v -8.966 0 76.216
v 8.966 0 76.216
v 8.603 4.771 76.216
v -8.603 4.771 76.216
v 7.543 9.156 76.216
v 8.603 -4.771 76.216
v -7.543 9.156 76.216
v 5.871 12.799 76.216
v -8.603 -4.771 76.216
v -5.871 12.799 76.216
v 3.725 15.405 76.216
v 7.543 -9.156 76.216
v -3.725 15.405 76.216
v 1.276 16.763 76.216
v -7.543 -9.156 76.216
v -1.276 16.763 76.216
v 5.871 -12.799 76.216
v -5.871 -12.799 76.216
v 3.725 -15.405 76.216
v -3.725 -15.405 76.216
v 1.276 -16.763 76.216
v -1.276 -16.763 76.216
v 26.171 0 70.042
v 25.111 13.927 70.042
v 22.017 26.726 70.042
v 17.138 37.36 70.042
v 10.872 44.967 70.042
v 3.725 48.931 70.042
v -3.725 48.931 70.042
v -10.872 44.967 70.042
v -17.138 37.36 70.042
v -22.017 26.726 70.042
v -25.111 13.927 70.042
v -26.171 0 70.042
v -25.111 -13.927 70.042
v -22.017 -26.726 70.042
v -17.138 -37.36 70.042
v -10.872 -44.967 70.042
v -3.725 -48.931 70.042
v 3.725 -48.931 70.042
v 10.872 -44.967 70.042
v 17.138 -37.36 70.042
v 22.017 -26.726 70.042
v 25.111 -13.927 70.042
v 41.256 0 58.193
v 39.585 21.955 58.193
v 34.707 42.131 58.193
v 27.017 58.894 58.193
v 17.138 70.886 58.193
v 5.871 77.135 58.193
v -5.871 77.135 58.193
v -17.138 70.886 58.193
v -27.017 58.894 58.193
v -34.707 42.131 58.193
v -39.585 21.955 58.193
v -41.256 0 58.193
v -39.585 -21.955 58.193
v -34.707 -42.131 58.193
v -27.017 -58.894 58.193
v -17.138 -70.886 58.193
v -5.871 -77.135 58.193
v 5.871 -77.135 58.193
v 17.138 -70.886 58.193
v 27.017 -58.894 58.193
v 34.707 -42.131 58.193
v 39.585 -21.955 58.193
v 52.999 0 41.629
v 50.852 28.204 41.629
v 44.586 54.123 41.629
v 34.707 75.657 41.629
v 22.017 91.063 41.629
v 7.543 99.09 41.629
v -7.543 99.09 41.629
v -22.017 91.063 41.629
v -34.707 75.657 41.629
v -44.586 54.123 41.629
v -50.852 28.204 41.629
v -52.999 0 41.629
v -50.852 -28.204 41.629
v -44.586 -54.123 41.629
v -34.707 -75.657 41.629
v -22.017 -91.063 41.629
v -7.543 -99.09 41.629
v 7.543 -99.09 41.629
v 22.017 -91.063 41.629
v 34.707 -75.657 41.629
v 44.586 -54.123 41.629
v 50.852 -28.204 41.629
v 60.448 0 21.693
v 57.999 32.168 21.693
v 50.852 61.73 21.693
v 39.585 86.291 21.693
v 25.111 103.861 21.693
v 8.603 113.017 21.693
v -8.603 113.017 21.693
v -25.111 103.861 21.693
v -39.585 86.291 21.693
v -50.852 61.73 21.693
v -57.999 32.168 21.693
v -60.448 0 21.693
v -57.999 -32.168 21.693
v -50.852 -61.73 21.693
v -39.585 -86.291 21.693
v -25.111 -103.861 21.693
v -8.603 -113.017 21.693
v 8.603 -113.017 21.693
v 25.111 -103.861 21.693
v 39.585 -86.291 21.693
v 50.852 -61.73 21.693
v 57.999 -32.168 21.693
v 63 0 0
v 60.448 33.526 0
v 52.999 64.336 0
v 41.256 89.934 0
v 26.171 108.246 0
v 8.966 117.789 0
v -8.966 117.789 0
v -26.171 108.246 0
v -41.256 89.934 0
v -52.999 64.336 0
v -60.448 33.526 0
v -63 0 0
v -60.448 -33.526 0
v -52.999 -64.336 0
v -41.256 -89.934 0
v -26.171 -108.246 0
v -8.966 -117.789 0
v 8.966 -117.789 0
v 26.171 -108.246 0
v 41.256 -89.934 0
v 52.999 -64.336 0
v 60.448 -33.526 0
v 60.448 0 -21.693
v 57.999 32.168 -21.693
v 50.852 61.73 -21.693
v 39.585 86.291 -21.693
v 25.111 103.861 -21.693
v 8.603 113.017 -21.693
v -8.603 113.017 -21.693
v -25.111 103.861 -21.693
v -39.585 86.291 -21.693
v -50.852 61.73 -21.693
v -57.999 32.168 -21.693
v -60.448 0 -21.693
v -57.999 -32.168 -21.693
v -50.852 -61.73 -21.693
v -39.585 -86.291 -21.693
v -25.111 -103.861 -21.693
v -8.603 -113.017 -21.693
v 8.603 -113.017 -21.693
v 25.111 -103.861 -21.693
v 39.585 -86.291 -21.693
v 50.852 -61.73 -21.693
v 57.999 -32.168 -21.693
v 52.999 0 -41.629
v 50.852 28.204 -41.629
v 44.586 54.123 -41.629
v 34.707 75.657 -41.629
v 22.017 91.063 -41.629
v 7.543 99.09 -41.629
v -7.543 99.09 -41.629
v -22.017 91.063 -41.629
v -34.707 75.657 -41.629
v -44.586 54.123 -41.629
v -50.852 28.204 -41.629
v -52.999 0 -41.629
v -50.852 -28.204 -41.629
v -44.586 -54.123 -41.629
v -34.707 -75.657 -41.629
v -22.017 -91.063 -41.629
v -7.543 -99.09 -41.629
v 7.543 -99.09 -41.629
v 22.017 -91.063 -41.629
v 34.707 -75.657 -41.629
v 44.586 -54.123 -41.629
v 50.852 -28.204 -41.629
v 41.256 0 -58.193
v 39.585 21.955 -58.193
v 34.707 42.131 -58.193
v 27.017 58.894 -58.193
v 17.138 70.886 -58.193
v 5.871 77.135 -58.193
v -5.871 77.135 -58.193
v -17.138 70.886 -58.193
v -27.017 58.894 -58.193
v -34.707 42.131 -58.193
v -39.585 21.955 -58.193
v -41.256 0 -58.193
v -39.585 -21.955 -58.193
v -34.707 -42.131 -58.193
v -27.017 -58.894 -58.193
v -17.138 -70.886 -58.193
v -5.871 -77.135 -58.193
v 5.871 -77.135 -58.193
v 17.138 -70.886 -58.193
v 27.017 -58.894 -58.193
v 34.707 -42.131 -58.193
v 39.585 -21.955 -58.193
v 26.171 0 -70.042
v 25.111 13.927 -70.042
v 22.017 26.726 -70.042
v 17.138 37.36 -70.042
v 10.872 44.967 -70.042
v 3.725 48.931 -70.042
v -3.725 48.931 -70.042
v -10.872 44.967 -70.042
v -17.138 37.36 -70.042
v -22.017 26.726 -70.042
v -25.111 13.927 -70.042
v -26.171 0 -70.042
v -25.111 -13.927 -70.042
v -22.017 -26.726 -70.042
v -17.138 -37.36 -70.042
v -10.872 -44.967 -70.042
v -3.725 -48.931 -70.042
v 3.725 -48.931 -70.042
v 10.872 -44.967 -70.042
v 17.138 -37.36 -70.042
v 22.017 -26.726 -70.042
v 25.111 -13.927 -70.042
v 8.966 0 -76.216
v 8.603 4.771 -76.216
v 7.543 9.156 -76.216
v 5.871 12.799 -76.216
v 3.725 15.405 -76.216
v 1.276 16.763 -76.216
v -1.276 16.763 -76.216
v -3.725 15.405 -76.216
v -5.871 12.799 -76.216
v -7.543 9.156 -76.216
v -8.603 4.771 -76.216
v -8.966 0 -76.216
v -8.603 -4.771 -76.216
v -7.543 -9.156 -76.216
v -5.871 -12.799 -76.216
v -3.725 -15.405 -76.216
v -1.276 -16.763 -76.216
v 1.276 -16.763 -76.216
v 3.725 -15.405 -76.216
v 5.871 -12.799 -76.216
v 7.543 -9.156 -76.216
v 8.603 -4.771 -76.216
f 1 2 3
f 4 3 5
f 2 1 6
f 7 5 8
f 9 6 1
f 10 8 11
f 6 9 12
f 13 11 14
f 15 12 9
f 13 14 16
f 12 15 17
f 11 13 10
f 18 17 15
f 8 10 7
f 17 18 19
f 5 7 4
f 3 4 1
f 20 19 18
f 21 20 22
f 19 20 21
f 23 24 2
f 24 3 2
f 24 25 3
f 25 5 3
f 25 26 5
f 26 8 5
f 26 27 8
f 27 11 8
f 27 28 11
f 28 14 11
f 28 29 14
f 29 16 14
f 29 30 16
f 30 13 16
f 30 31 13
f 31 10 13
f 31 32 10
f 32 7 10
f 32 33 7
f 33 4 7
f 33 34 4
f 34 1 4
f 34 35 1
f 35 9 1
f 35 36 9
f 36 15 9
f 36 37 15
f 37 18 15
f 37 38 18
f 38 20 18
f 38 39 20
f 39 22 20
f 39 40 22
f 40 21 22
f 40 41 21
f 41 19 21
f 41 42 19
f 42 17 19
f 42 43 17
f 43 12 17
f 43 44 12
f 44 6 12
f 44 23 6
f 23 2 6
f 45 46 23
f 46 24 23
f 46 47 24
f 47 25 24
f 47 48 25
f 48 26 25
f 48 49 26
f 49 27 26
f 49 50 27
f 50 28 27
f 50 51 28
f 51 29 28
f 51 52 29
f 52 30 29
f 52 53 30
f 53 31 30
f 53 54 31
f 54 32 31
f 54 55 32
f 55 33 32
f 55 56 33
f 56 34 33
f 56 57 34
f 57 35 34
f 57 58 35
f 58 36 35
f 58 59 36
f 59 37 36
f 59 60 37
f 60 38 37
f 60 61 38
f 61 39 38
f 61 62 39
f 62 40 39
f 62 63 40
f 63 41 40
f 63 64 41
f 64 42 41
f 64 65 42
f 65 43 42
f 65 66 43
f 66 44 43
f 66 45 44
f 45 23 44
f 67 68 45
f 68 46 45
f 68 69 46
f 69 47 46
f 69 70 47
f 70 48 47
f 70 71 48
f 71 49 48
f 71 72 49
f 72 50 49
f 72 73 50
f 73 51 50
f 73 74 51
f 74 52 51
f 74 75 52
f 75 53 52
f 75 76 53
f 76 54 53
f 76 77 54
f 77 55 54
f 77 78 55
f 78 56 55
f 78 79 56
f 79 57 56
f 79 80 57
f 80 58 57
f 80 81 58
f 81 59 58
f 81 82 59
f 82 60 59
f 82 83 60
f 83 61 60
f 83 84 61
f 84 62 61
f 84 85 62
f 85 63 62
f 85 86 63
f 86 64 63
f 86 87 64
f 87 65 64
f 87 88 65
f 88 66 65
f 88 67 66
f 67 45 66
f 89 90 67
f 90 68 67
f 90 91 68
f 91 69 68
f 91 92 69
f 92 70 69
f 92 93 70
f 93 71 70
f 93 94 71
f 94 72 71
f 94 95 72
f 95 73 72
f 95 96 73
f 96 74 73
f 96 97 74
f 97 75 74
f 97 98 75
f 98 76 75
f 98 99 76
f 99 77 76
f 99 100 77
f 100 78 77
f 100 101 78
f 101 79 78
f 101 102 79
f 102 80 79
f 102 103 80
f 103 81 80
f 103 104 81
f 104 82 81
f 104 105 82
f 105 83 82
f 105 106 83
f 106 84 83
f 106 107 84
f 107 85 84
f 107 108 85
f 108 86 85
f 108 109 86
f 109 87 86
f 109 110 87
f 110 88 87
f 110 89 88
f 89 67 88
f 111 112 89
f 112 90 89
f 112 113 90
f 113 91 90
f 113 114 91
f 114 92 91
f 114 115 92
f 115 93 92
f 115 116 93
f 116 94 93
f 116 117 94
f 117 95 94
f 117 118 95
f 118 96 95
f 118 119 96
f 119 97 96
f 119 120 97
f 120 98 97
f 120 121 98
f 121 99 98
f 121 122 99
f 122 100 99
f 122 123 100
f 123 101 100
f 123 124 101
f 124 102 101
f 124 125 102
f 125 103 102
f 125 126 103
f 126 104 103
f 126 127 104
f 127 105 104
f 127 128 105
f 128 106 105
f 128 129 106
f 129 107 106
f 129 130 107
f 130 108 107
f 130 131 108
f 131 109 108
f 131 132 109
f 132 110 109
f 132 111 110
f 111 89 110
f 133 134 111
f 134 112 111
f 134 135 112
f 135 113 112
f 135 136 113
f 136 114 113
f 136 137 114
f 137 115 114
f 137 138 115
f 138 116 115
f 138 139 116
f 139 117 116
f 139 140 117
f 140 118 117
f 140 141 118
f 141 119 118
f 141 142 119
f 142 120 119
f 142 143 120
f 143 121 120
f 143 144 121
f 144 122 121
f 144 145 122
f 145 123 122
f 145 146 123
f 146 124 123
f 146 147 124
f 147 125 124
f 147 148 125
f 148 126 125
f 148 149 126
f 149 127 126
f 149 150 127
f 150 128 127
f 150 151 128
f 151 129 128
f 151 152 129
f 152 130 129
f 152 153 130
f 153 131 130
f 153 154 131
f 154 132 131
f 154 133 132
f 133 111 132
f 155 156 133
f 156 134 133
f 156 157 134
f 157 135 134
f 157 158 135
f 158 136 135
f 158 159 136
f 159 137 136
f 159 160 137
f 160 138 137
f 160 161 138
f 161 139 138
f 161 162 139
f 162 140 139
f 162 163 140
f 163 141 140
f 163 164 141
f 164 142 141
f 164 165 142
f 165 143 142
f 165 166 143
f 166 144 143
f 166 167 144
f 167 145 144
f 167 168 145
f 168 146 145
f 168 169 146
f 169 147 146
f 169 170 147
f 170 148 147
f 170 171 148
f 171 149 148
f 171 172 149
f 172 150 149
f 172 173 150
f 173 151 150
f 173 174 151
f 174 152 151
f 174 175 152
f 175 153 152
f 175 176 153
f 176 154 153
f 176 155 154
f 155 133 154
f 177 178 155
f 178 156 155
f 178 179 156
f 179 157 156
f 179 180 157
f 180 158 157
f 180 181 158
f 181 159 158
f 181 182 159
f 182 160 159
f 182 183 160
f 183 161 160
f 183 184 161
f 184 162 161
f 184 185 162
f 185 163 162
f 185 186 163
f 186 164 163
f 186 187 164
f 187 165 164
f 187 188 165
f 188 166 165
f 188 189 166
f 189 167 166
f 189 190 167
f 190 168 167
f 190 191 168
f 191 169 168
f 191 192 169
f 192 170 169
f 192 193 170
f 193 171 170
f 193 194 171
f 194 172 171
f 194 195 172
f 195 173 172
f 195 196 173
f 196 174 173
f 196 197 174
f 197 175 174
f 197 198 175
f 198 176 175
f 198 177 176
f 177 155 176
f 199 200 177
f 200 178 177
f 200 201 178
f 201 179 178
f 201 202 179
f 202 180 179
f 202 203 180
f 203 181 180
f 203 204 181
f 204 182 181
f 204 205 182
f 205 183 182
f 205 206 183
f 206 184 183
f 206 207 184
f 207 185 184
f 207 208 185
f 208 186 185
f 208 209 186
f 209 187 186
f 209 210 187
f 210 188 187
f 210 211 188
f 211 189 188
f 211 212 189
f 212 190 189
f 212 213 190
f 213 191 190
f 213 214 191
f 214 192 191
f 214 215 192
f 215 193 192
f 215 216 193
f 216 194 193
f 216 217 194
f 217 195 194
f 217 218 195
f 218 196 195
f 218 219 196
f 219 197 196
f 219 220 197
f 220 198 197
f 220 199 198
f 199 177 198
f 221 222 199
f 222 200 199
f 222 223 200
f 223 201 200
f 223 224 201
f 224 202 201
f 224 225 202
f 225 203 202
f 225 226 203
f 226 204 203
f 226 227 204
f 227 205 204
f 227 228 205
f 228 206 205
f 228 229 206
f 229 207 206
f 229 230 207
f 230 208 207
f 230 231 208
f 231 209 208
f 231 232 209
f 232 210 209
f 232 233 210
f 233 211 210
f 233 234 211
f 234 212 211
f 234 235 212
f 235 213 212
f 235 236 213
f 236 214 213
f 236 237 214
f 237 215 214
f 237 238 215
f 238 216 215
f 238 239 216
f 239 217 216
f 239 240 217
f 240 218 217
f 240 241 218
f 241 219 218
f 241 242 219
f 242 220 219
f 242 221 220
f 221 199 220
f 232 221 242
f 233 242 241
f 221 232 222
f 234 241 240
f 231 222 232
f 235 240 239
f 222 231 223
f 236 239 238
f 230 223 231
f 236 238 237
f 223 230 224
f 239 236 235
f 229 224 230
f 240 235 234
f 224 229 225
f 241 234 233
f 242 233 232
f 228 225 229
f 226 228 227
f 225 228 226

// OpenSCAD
// Generated by SolidPython 1.0.1 on 2020-07-29 00:46:49


scale(v = [9, 17, 11]) {
	sphere(r = 7);
}
/***********************************************
*********      SolidPython code:      **********
************************************************
 
# import packages: SolidPython
from solid import *
from solid.utils import *
from itertools import chain, combinations, permutations


class Resize:

    def __init__(self, scad_file):
        self.scad_file = scad_file
        #self.scad_file = import_scad(scad_file)
        # cone/cylinder param:
        self.r1 = 0
        self.r2 = 0
        self.h = 0
        # rectangular prism param:
        self.w = 0
        self.l = 0
        # ellipse param:
        self.r = 0

    # import OpenScad code (file name corresponds to shape)


    # classify shape + parameters
    def assign(self, param1, param2, param3):
        if self.scad_file == 'cone.scad':
            self.r1 = param1
            self.r2 = param2
            self.h = param3
        elif self.scad_file == 'cylinder.scad':
            self.r1 = param1
            self.r2 = param2
            self.h = param3
        elif self.scad_file == 'rectangularPrism.scad':
            self.h = param1
            self.l = param2
            self.w = param3
        else:
            self.r = param1
            self.h = param2

    # resize parameters
    def iterate(self):
        x = range(3, 20, 2)
        i = 1
        if self.scad_file == 'cone.scad':
            tempList = list(permutations(x, 2))
            for temp in tempList:
                param1 = temp[0]
                param2 = temp[1]
                filepath = 'produced_scad_files/' + 'cone' + str(param1) + '_' + str(param2) + '_' + '.scad'
                scad_render_to_file(cylinder(h=param1, r1=param2, r2=0), filepath)

        elif self.scad_file == 'cylinder.scad':
            tempList = list(permutations(x, 3))
            for temp in tempList:
                param1 = temp[0]
                param2 = temp[1]
                filepath = 'produced_scad_files/' + 'cylinder' + str(param1) + '_' + str(param2) + '_' + '.scad'
                scad_render_to_file(cylinder(h=param1, r1=param2, r2=param2), filepath)

        elif self.scad_file == 'rectangularPrism.scad':
            tempList = list(permutations(x, 3))
            for temp in tempList:
                param1 = temp[0]
                param2 = temp[1]
                param3 = temp[2]
                filepath = 'produced_scad_files/' + 'rectangularPrism' + str(param1) + '_' + str(param2) + '_' + str(
                    param3) + '.scad'
                scad_render_to_file(cube(size=(param1, param2, param3)), filepath)

        elif self.scad_file == 'ellipse.scad':
            tempList = list(permutations(x, 4))
            for temp in tempList:
                param1 = temp[0]
                param2 = temp[1]
                param3 = temp[2]
                param4 = temp[3]
                filepath = 'produced_scad_files/' + 'ellipse' + str(param1) + '_' + str(param2) + '_' + str(param3) + '_' + str(param4) + '.scad'
                scad_render_to_file(scale([param1, param2, param3])(sphere(r=param4)), filepath)

    def render_to_scadfile(self):
        scad_render_to_file(scad, 'example.scad') 
 
************************************************/
